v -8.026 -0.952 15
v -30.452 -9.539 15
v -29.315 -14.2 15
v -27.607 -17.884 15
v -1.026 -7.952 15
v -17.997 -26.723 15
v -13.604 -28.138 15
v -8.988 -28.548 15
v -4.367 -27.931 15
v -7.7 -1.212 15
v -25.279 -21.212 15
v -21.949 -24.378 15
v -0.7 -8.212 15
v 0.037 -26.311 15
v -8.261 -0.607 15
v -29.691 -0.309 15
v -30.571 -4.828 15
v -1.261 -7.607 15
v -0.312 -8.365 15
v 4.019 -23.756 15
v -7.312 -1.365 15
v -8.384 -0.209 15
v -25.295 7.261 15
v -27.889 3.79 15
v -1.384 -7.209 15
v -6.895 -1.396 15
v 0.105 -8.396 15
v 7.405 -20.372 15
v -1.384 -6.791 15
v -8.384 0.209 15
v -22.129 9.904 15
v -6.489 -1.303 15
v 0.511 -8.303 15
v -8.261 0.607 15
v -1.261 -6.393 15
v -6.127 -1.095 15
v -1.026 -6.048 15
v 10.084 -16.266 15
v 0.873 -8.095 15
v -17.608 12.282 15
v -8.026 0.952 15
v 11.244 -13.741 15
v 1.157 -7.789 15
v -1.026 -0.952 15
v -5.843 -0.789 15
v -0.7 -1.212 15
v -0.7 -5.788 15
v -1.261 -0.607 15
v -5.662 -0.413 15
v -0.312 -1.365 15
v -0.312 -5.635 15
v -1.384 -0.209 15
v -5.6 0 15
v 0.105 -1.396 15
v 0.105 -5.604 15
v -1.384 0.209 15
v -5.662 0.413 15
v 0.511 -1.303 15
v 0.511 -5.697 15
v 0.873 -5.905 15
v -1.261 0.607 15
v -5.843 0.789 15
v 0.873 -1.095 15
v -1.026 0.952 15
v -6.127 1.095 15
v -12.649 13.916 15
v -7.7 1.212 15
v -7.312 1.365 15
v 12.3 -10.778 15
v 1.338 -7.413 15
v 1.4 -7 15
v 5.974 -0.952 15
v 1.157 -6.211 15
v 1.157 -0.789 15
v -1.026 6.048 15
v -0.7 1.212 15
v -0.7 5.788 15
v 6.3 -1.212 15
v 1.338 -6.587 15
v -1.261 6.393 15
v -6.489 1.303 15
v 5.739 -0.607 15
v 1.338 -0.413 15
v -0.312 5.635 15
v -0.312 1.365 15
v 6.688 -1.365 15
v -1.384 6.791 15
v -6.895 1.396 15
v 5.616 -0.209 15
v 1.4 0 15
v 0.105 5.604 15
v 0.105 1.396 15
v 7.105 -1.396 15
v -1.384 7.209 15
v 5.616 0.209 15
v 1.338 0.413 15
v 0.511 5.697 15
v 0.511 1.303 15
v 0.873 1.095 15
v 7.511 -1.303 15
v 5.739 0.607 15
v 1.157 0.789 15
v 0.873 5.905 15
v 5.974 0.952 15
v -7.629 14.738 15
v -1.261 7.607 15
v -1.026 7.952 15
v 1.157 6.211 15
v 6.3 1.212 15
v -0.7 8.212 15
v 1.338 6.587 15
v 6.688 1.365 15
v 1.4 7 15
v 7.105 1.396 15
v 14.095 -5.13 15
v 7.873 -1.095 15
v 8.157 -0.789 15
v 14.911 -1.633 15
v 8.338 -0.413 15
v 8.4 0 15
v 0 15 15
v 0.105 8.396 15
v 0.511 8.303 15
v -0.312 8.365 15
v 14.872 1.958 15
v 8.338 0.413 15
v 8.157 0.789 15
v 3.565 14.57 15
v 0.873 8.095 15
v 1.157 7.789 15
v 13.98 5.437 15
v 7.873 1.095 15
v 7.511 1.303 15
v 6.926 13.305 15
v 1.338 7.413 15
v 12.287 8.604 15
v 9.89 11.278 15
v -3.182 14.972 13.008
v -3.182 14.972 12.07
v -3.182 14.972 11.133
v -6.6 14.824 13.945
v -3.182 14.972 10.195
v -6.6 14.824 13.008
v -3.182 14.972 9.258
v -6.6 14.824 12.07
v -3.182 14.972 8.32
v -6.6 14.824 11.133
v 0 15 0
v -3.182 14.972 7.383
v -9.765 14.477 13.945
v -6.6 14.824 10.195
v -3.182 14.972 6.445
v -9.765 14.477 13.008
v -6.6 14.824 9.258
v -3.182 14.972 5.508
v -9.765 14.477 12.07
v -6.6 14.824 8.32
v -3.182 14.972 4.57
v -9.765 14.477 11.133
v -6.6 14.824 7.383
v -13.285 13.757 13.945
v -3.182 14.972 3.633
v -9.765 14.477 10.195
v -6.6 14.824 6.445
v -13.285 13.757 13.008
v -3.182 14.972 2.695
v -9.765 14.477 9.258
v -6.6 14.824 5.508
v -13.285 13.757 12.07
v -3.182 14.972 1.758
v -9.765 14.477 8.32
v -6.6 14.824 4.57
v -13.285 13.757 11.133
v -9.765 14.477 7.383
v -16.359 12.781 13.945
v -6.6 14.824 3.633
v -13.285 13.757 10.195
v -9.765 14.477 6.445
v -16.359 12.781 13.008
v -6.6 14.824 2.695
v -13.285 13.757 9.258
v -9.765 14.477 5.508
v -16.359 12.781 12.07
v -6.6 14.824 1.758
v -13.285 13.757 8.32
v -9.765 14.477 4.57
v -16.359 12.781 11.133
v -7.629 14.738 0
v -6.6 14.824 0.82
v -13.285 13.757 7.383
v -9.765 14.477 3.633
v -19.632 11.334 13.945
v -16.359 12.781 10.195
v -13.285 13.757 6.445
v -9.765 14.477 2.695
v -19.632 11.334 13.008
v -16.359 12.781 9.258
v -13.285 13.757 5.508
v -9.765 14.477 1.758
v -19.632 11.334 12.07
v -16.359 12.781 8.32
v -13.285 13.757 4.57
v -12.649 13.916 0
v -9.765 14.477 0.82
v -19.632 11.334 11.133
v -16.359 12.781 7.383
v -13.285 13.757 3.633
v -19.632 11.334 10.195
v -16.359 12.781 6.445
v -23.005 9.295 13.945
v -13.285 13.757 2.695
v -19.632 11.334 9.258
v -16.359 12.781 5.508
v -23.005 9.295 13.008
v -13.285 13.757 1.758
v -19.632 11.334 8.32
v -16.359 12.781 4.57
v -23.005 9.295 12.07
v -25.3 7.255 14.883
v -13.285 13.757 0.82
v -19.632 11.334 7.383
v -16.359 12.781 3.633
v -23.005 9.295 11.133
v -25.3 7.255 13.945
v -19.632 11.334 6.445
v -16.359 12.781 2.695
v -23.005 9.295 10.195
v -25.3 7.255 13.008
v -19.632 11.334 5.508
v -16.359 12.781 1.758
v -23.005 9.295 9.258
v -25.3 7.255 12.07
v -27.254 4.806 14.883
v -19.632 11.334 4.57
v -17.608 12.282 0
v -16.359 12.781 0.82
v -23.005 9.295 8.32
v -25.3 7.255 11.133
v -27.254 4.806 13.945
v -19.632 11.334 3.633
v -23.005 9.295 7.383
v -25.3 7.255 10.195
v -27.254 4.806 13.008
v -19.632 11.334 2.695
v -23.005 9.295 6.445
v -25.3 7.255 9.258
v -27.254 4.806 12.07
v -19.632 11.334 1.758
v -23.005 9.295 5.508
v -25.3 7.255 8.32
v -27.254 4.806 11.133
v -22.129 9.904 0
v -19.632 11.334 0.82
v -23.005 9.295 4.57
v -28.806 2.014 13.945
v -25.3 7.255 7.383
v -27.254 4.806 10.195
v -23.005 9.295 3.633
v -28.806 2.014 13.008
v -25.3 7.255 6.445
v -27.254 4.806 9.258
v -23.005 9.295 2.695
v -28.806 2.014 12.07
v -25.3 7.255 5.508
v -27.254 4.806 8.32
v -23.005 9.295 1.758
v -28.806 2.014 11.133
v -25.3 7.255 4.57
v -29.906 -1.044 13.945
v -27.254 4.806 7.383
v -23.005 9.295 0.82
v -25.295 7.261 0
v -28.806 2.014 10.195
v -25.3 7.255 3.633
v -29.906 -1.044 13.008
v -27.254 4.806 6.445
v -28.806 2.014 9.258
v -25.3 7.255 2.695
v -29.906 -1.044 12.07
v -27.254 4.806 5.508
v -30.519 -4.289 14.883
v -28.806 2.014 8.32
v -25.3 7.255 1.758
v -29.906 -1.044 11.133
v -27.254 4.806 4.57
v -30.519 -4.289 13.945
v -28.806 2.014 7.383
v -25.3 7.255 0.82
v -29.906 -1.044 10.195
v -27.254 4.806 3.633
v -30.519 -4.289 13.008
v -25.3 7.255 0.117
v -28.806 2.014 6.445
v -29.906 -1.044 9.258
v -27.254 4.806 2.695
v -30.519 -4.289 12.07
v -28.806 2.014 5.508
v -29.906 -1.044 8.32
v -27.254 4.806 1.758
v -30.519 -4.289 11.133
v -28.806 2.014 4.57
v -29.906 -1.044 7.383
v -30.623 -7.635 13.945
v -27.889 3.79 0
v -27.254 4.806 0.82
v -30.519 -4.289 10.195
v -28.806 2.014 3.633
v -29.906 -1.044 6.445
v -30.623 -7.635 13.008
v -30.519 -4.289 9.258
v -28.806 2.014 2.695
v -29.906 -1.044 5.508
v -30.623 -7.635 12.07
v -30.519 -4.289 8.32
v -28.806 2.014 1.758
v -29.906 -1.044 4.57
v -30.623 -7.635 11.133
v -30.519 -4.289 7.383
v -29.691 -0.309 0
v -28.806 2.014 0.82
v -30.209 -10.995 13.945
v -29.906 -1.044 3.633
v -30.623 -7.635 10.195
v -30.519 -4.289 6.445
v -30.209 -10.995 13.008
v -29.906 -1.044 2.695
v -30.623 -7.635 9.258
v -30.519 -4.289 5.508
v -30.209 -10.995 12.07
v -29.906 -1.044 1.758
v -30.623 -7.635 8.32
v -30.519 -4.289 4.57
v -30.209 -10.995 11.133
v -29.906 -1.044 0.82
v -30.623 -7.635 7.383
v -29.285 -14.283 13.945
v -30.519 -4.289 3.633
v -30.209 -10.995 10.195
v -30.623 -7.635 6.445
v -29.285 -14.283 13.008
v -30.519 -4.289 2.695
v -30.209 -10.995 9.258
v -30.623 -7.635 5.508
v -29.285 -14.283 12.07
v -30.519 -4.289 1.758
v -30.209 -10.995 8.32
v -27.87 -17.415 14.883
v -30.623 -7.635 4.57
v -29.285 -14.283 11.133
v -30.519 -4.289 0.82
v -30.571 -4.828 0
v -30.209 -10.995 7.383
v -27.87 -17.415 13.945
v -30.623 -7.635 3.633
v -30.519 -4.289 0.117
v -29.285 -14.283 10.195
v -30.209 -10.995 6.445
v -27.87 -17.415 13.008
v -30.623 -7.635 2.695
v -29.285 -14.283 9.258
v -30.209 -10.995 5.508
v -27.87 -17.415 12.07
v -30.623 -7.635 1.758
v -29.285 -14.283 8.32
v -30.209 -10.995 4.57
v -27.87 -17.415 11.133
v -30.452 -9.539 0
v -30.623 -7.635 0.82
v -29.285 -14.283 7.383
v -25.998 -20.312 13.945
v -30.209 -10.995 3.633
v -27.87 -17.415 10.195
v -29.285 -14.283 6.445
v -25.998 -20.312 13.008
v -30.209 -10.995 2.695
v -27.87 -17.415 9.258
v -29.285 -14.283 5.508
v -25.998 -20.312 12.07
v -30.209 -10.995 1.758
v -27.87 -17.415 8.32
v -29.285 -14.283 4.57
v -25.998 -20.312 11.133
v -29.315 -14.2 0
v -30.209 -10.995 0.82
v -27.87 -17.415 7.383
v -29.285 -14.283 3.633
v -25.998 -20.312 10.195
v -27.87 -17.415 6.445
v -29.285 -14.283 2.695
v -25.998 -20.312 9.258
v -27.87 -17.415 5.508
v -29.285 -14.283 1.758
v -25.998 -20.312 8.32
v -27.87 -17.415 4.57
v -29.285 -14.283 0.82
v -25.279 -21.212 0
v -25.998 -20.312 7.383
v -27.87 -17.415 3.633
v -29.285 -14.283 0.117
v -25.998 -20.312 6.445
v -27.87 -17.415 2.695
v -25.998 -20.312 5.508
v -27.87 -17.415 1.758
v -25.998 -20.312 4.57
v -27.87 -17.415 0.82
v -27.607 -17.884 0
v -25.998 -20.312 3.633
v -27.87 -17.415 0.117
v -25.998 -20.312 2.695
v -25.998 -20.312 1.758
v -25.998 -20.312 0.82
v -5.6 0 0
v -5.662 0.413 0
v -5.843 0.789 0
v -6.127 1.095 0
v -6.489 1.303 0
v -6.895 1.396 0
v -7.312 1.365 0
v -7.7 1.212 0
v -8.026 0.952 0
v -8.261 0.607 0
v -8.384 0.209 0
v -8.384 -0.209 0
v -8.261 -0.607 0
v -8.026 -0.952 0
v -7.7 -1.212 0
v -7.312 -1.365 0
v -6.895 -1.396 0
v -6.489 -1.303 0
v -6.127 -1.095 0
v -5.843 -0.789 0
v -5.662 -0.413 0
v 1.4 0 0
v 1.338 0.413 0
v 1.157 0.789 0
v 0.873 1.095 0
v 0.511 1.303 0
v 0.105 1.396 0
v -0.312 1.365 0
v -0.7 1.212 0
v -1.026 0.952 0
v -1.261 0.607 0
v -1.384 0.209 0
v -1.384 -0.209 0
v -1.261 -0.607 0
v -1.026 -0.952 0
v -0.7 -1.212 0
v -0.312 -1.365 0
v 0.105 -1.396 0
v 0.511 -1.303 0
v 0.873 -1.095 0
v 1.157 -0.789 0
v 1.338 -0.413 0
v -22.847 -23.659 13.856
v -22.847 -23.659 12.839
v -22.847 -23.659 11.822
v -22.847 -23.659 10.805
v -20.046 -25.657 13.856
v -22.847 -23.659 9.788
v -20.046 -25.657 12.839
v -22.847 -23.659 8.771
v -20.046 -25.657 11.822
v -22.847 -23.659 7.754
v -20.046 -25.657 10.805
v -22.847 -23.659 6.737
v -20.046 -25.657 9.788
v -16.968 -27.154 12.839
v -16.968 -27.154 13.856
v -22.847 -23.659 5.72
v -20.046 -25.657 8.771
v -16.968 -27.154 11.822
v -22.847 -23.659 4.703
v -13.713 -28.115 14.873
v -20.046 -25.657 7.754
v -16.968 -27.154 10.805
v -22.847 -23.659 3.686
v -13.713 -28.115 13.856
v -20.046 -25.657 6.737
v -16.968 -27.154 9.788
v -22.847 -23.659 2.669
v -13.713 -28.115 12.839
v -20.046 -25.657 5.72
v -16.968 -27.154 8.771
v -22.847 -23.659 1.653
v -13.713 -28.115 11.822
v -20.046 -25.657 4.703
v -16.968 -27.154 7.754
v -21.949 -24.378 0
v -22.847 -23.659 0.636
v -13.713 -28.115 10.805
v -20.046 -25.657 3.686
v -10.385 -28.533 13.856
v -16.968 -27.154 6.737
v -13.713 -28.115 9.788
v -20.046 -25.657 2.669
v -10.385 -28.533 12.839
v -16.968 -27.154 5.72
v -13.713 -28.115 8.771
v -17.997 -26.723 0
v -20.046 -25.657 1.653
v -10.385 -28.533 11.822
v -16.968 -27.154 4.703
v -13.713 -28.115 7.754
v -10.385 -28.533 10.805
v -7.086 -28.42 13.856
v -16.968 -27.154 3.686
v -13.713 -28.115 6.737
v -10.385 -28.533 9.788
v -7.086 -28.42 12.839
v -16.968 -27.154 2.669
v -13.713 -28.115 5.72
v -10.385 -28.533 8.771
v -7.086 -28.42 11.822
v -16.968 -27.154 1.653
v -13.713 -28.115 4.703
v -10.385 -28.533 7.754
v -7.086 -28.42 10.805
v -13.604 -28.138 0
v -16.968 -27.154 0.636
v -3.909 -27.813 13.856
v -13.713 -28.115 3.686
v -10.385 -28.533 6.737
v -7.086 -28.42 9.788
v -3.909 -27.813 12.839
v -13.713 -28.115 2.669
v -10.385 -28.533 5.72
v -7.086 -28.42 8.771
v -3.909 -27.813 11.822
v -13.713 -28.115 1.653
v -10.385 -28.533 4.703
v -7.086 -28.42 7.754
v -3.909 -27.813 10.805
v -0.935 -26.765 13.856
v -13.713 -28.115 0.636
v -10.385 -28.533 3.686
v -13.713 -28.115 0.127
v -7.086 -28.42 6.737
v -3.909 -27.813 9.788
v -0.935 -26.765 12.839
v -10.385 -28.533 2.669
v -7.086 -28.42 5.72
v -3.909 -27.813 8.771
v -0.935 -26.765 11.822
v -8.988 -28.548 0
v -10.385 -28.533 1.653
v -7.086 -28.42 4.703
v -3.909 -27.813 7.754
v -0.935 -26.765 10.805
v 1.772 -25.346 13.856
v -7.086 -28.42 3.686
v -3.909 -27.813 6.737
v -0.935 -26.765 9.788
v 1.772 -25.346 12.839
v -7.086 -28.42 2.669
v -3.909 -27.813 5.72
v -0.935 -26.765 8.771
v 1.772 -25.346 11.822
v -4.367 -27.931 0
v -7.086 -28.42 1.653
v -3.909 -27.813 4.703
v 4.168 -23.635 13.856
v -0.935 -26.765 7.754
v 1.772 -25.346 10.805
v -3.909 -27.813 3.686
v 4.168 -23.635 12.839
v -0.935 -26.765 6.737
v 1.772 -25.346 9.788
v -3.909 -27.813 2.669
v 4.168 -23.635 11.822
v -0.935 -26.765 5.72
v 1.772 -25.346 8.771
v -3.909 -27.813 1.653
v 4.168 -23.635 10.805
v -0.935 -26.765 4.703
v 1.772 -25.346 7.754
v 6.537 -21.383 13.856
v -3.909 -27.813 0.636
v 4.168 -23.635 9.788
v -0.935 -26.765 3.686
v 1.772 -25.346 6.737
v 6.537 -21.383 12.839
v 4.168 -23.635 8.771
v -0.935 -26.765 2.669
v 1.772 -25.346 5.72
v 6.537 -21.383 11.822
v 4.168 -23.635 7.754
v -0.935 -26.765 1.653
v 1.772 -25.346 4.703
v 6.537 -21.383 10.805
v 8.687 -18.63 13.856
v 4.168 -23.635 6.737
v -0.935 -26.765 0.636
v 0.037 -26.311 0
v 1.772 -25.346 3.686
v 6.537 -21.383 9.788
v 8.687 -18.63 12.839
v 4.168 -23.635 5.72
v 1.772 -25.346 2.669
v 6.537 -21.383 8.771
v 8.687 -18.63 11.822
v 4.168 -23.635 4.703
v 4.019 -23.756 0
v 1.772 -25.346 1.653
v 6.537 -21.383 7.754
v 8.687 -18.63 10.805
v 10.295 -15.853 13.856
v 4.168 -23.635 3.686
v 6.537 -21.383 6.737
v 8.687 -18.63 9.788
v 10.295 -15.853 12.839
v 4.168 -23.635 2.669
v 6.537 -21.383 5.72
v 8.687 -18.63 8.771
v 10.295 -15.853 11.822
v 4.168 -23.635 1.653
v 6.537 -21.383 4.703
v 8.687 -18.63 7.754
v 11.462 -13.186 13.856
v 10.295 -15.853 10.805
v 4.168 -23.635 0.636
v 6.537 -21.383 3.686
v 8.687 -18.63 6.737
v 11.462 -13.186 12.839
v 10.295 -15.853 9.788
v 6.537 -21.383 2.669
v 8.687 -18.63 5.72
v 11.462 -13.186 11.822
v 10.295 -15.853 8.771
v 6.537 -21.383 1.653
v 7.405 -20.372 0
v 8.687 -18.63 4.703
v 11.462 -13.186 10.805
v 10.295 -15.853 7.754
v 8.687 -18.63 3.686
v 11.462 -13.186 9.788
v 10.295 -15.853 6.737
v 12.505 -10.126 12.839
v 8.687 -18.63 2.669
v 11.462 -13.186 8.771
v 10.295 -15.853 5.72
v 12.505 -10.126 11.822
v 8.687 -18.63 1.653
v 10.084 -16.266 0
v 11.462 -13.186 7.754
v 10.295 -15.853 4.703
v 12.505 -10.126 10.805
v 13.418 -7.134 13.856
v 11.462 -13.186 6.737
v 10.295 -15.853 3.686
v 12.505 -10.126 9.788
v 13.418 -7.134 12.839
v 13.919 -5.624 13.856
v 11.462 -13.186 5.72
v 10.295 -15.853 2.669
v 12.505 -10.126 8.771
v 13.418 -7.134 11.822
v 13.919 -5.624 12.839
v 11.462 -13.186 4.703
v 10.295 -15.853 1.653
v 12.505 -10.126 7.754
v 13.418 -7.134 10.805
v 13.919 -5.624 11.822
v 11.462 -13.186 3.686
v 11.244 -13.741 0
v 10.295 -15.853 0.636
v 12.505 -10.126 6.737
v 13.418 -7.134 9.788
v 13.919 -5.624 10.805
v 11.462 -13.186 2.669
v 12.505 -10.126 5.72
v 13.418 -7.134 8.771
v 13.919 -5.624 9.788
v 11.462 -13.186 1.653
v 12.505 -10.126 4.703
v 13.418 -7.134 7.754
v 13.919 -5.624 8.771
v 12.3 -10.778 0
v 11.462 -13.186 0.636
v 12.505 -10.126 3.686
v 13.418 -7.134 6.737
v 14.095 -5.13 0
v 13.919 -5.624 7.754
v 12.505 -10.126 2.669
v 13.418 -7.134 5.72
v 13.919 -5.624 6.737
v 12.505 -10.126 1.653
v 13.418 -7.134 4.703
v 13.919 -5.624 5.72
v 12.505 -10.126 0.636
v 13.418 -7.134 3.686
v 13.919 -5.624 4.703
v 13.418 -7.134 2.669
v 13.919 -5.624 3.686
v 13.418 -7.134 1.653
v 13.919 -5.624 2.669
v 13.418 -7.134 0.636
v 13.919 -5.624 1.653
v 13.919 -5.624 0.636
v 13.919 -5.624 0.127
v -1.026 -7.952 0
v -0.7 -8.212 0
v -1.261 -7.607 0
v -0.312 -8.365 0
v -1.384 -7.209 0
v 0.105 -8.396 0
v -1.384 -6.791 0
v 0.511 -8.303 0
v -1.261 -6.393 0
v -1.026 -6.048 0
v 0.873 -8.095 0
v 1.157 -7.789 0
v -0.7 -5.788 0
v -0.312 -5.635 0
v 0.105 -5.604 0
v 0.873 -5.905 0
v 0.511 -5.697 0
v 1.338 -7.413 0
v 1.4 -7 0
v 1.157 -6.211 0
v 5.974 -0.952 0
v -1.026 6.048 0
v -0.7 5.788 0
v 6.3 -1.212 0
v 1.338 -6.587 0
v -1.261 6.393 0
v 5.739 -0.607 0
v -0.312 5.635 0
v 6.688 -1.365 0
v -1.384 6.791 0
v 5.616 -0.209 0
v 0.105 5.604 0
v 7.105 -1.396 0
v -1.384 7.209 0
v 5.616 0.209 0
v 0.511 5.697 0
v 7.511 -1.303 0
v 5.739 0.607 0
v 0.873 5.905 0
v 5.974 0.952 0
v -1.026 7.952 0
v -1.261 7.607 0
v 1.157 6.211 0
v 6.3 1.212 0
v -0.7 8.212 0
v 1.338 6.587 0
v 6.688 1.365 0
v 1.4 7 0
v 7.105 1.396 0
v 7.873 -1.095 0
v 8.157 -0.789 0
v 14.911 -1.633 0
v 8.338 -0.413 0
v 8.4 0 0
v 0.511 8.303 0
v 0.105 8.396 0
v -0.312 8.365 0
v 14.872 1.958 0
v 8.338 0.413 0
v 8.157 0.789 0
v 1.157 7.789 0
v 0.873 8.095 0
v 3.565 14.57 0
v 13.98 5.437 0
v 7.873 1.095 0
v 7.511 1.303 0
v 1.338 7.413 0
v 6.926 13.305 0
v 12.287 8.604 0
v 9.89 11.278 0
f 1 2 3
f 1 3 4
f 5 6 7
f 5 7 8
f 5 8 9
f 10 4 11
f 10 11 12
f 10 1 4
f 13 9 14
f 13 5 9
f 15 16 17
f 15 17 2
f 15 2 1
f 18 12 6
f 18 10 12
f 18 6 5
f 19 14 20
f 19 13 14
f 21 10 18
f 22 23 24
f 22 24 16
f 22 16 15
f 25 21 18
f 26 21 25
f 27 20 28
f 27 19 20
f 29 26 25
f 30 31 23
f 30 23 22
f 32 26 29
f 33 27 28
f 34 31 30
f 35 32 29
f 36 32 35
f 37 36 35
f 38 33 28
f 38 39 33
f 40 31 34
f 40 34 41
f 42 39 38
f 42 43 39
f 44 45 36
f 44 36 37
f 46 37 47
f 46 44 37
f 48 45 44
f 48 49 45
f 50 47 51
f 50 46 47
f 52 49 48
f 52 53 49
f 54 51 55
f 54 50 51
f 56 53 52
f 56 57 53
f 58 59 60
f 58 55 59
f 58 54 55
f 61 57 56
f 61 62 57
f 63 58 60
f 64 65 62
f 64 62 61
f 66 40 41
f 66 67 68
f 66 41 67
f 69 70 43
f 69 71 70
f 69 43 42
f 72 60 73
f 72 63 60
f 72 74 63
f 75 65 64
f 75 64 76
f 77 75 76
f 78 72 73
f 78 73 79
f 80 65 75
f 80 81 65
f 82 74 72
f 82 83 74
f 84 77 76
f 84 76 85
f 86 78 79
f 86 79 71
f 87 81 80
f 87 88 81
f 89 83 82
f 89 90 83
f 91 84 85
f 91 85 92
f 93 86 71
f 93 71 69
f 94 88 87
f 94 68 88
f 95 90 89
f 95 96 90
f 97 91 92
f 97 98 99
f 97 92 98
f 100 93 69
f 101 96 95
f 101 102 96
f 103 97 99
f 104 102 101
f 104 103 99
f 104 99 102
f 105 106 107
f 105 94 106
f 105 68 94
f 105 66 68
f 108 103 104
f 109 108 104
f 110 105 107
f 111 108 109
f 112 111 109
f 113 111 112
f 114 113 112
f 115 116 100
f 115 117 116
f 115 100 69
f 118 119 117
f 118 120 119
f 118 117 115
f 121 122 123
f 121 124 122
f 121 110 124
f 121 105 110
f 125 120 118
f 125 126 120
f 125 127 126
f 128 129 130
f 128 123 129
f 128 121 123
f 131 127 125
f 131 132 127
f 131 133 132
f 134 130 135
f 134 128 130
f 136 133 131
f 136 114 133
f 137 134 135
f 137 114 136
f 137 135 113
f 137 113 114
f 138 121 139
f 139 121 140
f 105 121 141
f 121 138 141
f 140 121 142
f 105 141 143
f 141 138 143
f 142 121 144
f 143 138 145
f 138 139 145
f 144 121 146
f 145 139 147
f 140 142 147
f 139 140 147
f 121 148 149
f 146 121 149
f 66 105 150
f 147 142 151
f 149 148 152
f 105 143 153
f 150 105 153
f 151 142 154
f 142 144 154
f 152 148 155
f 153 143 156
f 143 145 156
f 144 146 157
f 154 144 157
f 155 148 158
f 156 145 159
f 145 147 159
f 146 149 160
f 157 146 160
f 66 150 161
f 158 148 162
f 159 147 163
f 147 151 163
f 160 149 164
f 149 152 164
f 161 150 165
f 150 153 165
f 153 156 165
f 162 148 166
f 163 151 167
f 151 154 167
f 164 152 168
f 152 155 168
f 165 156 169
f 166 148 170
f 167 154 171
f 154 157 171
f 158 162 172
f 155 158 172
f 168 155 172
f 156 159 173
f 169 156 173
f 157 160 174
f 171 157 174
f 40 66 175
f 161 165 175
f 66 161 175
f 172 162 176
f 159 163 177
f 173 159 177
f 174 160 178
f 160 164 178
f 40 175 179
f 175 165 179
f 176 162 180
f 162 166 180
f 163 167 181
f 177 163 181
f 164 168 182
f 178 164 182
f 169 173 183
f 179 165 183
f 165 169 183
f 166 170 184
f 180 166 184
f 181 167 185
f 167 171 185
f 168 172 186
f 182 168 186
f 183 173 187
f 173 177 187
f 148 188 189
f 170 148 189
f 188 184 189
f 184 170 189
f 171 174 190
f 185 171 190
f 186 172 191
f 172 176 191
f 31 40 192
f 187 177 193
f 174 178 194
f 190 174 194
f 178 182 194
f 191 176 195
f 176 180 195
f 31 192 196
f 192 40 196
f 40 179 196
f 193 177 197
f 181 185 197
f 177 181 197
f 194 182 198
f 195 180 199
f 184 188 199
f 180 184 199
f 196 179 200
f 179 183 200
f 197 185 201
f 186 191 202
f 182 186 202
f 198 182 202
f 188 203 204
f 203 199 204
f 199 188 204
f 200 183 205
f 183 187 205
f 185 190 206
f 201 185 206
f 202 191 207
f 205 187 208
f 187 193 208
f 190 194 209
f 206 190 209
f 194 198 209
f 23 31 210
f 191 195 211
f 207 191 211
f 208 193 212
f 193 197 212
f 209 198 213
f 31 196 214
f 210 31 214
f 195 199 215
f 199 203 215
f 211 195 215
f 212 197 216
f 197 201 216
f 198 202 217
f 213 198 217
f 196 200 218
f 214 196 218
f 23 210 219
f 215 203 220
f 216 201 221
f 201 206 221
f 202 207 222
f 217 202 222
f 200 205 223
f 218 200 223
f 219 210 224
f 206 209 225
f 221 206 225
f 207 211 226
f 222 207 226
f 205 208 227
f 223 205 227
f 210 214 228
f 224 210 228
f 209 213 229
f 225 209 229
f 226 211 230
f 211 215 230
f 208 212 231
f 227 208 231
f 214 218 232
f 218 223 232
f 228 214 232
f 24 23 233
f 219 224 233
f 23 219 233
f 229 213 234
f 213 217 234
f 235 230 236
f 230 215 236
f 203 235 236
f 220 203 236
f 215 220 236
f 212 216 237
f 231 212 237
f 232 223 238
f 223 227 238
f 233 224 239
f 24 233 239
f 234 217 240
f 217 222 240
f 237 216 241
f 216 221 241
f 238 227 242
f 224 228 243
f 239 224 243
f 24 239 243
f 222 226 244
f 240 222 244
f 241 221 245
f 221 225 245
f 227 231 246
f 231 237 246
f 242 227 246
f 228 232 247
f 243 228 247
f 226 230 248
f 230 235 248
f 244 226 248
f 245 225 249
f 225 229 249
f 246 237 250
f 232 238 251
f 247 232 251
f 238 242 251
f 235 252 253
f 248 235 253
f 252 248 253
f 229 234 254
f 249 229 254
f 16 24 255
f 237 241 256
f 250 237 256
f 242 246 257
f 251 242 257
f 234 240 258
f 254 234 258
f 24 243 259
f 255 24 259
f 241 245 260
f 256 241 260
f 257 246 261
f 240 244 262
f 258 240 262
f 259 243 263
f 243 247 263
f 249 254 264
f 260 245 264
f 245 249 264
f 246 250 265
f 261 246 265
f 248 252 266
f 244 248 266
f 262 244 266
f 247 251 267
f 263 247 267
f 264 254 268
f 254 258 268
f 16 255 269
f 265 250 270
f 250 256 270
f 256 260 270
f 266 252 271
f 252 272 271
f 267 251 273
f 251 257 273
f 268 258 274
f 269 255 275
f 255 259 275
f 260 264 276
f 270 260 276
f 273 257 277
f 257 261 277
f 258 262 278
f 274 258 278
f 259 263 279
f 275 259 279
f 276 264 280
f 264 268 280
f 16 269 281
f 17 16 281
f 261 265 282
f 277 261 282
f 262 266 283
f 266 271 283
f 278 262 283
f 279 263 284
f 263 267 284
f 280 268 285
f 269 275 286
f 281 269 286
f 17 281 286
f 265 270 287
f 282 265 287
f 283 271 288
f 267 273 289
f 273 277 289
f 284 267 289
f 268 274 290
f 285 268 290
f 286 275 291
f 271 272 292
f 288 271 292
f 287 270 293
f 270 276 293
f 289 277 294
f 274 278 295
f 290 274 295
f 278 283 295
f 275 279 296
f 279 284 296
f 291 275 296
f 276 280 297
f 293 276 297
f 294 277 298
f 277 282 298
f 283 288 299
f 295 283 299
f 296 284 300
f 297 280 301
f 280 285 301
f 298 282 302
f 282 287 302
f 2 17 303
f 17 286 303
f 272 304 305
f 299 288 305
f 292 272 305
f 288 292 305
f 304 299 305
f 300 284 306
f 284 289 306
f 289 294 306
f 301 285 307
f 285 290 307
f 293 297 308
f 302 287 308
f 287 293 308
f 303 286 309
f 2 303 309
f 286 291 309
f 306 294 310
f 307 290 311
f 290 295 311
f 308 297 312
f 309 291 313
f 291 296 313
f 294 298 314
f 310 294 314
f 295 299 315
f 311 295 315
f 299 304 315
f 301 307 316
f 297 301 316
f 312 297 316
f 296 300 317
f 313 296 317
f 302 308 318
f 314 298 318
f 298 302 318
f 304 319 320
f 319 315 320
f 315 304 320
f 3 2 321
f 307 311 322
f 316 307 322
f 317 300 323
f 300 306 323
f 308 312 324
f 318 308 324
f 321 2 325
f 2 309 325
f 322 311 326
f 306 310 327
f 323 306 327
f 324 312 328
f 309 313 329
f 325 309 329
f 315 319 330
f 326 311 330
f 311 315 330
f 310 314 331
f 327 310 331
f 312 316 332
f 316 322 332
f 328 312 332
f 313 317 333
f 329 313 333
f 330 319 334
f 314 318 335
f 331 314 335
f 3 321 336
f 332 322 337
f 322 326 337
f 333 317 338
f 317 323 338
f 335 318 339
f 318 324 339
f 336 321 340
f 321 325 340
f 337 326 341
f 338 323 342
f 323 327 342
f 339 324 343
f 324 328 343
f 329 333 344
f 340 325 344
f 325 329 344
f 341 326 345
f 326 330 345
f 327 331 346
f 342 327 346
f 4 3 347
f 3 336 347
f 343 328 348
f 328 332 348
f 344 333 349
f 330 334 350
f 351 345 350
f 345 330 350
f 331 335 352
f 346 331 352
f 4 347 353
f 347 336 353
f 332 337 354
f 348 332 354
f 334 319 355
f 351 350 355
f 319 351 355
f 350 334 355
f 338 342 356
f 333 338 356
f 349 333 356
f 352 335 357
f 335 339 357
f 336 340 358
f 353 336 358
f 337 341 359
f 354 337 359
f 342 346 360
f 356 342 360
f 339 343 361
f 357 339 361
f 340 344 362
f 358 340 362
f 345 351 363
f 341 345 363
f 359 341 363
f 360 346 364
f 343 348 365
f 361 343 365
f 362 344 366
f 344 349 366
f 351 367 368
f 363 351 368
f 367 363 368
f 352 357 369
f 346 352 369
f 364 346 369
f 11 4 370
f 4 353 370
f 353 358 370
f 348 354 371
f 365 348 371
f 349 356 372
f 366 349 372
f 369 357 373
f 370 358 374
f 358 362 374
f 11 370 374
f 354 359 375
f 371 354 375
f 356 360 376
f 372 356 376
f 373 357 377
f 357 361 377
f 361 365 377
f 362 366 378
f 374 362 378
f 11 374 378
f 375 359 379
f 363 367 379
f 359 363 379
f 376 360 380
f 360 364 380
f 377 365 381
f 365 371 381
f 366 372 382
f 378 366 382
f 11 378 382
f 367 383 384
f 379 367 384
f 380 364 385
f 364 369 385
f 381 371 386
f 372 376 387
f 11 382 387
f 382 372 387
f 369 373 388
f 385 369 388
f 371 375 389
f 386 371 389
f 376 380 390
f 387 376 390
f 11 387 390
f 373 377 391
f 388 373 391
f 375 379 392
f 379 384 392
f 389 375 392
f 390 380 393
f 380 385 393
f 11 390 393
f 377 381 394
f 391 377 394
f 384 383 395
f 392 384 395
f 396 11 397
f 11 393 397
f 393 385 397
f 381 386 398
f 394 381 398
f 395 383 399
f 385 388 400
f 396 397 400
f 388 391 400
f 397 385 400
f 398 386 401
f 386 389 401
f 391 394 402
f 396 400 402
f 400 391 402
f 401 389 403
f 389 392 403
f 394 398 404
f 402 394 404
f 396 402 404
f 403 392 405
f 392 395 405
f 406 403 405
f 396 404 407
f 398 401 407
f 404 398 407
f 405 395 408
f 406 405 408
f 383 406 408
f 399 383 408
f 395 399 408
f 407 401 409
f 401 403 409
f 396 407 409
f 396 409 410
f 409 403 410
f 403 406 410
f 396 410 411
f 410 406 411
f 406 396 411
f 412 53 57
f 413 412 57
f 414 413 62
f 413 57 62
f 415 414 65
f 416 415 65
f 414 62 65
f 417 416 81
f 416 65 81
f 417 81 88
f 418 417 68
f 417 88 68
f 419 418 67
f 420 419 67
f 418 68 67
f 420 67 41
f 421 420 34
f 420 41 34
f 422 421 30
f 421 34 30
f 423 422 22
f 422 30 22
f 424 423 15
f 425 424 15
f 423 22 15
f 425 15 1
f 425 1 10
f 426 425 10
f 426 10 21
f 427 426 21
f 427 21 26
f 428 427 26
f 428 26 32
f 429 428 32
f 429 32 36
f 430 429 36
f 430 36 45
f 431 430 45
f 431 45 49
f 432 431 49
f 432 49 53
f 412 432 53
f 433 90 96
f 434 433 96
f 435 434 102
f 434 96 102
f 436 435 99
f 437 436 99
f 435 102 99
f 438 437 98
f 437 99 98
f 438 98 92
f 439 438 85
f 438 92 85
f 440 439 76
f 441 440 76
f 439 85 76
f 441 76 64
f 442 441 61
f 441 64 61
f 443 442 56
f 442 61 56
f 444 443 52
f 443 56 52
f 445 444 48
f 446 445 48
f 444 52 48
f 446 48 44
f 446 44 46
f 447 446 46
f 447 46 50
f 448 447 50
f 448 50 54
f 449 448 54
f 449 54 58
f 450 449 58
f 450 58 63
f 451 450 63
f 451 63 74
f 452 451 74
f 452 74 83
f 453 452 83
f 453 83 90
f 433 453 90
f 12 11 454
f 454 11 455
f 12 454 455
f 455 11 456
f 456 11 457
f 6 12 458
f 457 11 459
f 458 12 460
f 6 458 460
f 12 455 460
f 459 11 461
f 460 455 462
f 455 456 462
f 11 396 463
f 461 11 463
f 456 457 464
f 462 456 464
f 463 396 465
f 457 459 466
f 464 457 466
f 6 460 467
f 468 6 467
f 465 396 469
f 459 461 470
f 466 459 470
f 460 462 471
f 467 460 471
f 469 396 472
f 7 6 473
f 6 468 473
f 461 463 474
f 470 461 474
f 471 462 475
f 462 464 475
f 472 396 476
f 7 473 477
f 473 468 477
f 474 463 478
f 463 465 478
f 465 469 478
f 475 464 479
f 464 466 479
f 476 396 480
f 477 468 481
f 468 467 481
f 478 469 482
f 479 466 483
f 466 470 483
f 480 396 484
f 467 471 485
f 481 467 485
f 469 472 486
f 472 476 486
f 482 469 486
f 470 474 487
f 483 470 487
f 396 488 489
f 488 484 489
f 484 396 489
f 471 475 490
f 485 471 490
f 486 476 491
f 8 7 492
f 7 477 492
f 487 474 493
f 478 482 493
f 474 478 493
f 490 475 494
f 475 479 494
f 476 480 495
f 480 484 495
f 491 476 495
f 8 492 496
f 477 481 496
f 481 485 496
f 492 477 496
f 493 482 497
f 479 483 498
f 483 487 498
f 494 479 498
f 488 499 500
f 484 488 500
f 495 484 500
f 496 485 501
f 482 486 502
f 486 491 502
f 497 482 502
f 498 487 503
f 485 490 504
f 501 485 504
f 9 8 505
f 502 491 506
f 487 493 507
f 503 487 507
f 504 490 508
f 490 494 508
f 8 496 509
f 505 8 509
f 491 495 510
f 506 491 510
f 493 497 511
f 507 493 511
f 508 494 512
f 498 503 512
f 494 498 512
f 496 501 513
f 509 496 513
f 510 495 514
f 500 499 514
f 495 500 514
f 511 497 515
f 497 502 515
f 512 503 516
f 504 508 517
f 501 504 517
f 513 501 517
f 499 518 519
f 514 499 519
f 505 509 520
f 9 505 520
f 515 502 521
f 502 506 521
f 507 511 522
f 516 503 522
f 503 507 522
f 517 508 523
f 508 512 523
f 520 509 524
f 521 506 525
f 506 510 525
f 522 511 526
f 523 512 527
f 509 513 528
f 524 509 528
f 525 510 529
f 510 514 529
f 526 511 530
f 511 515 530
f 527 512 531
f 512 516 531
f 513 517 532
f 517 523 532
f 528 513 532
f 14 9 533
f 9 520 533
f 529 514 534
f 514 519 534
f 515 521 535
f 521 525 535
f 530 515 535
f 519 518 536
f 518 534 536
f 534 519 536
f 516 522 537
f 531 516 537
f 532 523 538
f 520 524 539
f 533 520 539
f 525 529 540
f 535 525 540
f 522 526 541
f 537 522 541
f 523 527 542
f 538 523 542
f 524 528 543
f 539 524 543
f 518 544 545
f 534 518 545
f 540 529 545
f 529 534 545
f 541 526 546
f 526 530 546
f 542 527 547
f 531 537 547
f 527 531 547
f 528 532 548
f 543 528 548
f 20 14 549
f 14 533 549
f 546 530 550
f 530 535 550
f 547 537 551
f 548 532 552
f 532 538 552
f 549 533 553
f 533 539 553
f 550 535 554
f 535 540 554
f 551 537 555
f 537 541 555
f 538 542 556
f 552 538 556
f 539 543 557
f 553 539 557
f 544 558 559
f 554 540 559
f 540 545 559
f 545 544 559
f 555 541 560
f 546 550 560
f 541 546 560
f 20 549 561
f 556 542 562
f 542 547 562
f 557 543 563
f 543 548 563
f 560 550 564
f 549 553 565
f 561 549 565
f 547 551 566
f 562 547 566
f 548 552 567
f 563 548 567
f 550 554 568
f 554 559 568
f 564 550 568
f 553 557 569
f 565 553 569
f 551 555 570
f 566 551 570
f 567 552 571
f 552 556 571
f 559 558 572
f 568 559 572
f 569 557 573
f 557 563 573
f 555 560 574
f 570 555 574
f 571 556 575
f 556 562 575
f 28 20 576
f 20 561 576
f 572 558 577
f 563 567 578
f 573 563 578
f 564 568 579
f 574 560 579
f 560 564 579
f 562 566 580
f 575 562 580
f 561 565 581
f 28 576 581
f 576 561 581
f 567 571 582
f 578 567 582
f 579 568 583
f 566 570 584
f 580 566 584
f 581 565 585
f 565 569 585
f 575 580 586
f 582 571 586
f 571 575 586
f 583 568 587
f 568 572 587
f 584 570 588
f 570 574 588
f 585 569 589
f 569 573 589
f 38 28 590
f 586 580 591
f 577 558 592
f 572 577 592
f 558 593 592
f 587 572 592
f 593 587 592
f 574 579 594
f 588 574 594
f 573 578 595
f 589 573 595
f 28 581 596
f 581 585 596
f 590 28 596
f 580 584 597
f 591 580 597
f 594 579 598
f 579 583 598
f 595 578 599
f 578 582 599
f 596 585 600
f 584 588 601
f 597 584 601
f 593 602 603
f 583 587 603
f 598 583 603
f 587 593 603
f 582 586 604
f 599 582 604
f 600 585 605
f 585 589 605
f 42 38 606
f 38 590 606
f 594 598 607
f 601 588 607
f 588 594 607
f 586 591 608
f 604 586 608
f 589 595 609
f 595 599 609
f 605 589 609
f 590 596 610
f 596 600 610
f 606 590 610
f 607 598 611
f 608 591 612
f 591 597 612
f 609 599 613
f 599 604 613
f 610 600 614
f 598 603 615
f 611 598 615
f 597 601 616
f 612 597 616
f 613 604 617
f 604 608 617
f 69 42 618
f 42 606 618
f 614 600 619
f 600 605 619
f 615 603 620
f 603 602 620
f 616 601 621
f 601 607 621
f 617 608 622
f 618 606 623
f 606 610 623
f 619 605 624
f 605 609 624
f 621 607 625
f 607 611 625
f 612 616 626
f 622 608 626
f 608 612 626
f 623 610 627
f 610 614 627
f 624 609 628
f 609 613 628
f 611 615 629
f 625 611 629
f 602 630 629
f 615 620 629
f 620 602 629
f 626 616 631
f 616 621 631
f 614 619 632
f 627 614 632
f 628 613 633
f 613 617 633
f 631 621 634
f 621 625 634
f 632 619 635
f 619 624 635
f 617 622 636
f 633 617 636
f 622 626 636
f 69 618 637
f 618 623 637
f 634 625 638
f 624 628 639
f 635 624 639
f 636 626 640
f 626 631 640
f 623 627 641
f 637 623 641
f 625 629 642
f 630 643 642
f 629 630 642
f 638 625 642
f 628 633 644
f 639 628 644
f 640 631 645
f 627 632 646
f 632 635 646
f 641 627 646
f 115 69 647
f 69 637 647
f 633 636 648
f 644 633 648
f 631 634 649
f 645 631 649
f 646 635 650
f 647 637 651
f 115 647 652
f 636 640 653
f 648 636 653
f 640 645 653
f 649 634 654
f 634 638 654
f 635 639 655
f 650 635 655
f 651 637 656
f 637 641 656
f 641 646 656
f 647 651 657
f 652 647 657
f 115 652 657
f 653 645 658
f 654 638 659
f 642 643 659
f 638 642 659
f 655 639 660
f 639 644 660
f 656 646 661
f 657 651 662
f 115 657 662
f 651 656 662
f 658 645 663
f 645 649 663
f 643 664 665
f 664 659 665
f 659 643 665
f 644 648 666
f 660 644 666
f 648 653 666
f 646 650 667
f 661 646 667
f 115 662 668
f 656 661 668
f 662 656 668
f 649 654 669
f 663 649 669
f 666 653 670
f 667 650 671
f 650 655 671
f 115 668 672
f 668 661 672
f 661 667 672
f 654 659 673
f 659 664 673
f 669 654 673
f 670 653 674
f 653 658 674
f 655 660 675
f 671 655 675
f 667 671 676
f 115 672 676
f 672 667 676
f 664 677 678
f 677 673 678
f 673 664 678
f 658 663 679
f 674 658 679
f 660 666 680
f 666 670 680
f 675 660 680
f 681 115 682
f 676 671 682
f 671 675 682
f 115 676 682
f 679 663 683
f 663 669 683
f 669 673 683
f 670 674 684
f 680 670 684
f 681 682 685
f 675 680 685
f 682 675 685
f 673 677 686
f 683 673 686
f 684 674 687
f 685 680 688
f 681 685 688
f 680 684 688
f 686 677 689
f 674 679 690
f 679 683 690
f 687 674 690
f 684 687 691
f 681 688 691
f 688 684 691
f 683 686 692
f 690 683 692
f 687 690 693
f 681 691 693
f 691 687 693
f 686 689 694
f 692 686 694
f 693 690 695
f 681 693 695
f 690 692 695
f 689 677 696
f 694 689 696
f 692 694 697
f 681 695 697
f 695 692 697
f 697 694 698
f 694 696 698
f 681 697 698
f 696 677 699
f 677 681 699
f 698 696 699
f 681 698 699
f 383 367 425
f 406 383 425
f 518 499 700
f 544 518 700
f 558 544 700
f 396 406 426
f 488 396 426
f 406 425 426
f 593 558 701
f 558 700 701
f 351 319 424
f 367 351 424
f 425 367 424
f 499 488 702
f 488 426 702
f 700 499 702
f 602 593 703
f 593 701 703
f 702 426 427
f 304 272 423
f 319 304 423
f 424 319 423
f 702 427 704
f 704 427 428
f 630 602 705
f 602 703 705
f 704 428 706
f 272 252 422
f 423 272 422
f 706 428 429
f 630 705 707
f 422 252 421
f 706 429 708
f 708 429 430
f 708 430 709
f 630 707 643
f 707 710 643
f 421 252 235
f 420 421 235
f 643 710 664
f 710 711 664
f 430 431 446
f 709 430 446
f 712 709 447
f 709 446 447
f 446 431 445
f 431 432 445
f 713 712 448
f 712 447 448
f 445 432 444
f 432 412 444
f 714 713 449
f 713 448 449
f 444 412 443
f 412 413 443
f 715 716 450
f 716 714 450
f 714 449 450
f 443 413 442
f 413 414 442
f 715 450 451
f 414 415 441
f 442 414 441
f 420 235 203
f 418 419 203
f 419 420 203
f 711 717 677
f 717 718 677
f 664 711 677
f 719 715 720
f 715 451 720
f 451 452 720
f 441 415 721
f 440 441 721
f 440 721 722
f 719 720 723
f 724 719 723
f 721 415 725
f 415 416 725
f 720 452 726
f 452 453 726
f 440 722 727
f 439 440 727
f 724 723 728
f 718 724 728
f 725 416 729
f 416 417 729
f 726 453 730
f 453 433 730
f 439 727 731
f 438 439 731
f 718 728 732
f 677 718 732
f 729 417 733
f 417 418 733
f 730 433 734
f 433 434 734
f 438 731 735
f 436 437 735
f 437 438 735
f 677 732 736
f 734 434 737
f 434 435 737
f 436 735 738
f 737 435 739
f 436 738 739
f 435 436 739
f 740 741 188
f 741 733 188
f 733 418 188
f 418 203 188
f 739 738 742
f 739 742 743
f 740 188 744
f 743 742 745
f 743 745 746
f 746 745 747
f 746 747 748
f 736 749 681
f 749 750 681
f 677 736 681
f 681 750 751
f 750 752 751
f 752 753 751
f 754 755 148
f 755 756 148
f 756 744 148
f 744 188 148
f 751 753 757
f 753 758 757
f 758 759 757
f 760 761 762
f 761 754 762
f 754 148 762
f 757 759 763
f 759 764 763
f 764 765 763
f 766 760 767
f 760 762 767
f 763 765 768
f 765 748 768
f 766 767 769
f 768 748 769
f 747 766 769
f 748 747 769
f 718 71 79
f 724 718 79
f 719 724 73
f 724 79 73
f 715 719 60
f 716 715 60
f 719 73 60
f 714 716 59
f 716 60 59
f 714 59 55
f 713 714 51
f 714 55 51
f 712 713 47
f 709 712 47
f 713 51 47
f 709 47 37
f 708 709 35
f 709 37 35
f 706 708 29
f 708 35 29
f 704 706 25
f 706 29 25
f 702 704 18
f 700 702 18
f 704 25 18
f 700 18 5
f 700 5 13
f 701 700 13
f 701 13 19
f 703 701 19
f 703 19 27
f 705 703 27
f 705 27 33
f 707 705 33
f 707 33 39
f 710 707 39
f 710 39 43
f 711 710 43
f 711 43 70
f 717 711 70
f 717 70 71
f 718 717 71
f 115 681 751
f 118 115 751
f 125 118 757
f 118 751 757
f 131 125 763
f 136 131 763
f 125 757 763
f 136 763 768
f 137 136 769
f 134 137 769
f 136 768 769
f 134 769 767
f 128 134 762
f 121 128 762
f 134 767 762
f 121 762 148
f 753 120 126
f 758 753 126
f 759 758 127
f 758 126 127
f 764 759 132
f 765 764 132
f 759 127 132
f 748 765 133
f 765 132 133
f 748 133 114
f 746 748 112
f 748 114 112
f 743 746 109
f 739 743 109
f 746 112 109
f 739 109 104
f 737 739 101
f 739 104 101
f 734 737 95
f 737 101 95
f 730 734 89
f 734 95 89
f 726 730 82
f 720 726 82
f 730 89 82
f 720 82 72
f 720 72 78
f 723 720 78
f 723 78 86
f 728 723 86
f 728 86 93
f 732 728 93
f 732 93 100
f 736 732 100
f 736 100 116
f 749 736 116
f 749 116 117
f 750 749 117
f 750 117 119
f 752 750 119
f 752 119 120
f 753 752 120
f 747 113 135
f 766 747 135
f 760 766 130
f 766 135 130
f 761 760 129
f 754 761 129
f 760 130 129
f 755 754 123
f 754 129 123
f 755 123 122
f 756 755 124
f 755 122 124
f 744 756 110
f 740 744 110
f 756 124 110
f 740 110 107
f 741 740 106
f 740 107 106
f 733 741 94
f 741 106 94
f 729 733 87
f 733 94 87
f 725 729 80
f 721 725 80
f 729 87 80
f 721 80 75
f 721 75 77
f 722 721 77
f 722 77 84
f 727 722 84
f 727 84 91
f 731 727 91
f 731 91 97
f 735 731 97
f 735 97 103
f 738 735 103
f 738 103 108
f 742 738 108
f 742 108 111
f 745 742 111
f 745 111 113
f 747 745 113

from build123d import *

# Parameters (mm, degrees)
EXTRUDE_1_DEPTH     = 15
SKETCH_3_R          = 1.4
CUT_EXTRUDE_2_DEPTH = 45.491091955


with BuildPart() as part:
    # 草图1 → 凸台-拉伸1 (new body)
    with BuildSketch(Plane.XY):
        with BuildLine():
            ThreePointArc((14.095389312, -5.13030215), (12.287280664, 8.603646545), (0, 15))
            add(Edge.make_bspline(
                [(0, 15), (-0.174596768, 14.999999319), (-0.436611581, 14.999693042), (-0.786186323, 14.998643785), (-1.048915847, 14.997519085), (-1.312216235, 14.99603471), (-1.576228693, 14.994161918), (-1.84109342, 14.991865662), (-2.106949414, 14.989104591), (-2.373934268, 14.985831089), (-2.642183971, 14.981991319), (-2.911832716, 14.977525266), (-3.1830127, 14.972366794), (-3.455853932, 14.966443701), (-3.730484039, 14.959677782), (-4.007028071, 14.9519849), (-4.285608318, 14.943275054), (-4.566344116, 14.933452466), (-4.849351664, 14.922415656), (-5.134743838, 14.910057537), (-5.422630012, 14.896265505), (-5.713115875, 14.880921543), (-6.006303259, 14.863902316), (-6.302289959, 14.84507929), (-6.601169567, 14.824318836), (-6.903031299, 14.801482354), (-7.207959833, 14.776426392), (-7.516035146, 14.749002775), (-7.827332351, 14.719058736), (-8.141921549, 14.686437053), (-8.459867669, 14.650976187), (-8.781230323, 14.612510428), (-9.106063662, 14.570870045), (-9.434416233, 14.525881438), (-9.766330843, 14.477367292), (-10.101844426, 14.425146744), (-10.440987913, 14.36903554), (-10.783786108, 14.30884621), (-11.130257567, 14.244388236), (-11.480414483, 14.175468229), (-11.834262574, 14.101890107), (-12.191800976, 14.023455277), (-12.553022141, 13.939962822), (-12.917911738, 13.851209688), (-13.286448564, 13.756990875), (-13.658604451, 13.657099633), (-14.03434419, 13.551327657), (-14.413625446, 13.439465288), (-14.796398691, 13.321301714), (-15.182607133, 13.196625177), (-15.572186657, 13.065223175), (-15.965065767, 12.926882676), (-16.361165533, 12.781390325), (-16.760399548, 12.62853266), (-17.162673883, 12.468096321), (-17.567887059, 12.299868276), (-17.975930009, 12.12363602), (-18.386686074, 11.939187837), (-18.800030904, 11.746312879), (-19.21583277, 11.544801919), (-19.63395132, 11.334445536), (-20.054242271, 11.115042096), (-20.476539575, 10.886368472), (-20.900723293, 10.648292485), (-21.326461435, 10.400346233), (-21.753514654, 10.143757392), (-22.178049863, 9.87535726), (-22.595959424, 9.592299141), (-23.006858872, 9.296248411), (-23.410215858, 8.987163154), (-23.805723663, 8.665361009), (-24.19302422, 8.331073979), (-24.571782966, 7.984568061), (-24.94166894, 7.626110759), (-25.302360391, 7.255979562), (-25.65354351, 6.874459377), (-25.994913004, 6.481842935), (-26.326172169, 6.078430394), (-26.647033089, 5.664529144), (-26.957216795, 5.240453567), (-27.256453426, 4.80652479), (-27.544482381, 4.363070443), (-27.82105247, 3.910424411), (-28.085922052, 3.448926584), (-28.338859169, 2.978922599), (-28.579641679, 2.500763586), (-28.808057373, 2.014805906), (-29.023904095, 1.521410888), (-29.226989847, 1.020944566), (-29.417132895, 0.513777409), (-29.594161862, 0.000284053), (-29.757915818, -0.519156969), (-29.908244365, -1.044163505), (-30.045007708, -1.574350056), (-30.168076728, -2.109328051), (-30.277333041, -2.648706129), (-30.372669056, -3.192090415), (-30.453988019, -3.739084801), (-30.521204062, -4.289291227), (-30.574242228, -4.842309963), (-30.613038507, -5.39773989), (-30.637539851, -5.955178784), (-30.647704191, -6.514223598), (-30.643500444, -7.074470745), (-30.624908509, -7.63551638), (-30.591919266, -8.196956684), (-30.544534557, -8.758388145), (-30.48276717, -9.319407838), (-30.406640805, -9.879613709), (-30.316190047, -10.438604851), (-30.21146032, -10.995981785), (-30.092507839, -11.551346736), (-29.95939956, -12.104303912), (-29.812213112, -12.654459772), (-29.651036733, -13.201423307), (-29.475969194, -13.744806302), (-29.287119719, -14.284223615), (-29.084607895, -14.819293432), (-28.868563581, -15.349637541), (-28.639126801, -15.874881588), (-28.396447646, -16.394655341), (-28.140686152, -16.908592941), (-27.872012186, -17.416333158), (-27.590605319, -17.917519643), (-27.296654692, -18.411801174), (-26.990358881, -18.898831896), (-26.671925755, -19.378271573), (-26.341572303, -19.849785794), (-25.885480421, -20.467504768), (-25.526267712, -20.917866263), (-25.279466623, -21.21199112)],
                knots=[0, 0, 0, 0, 0.008983592, 0.013481544, 0.017986876, 0.022502032, 0.027029448, 0.031571543, 0.036130722, 0.040709366, 0.045309838, 0.049934477, 0.054585593, 0.059265472, 0.063976367, 0.068720504, 0.073500073, 0.078317234, 0.083174111, 0.088072793, 0.093015336, 0.098003759, 0.103040044, 0.108126138, 0.113263955, 0.118455369, 0.123702222, 0.129006319, 0.134369433, 0.139793302, 0.145279632, 0.150830096, 0.156446337, 0.162129965, 0.167882565, 0.173705688, 0.179600863, 0.185569587, 0.191613334, 0.197733555, 0.203931674, 0.210209093, 0.216567194, 0.223007337, 0.229530862, 0.236139089, 0.242833322, 0.249614847, 0.256484933, 0.263444834, 0.270495789, 0.277639024, 0.284875752, 0.292207171, 0.299634469, 0.307158825, 0.314781404, 0.322503362, 0.330325849, 0.338250002, 0.346276954, 0.354407827, 0.362643738, 0.370985797, 0.379435108, 0.387992769, 0.396619209, 0.405274739, 0.413959558, 0.422673829, 0.431417677, 0.440191194, 0.448994436, 0.457827427, 0.466690157, 0.475582587, 0.484504647, 0.493456237, 0.50243723, 0.511447469, 0.520486775, 0.529554938, 0.538651727, 0.547776885, 0.556930133, 0.566111169, 0.575319669, 0.584555288, 0.593817663, 0.603106409, 0.612421123, 0.621761385, 0.631126755, 0.64051678, 0.649930987, 0.659368891, 0.66882999, 0.678313767, 0.687819694, 0.697347228, 0.706895812, 0.71646488, 0.726053851, 0.735662137, 0.745289135, 0.754934234, 0.764596814, 0.774276244, 0.783971886, 0.793683092, 0.803409207, 0.813149569, 0.822903507, 0.832670344, 0.8424494, 0.852239983, 0.862041401, 0.871852953, 0.881673937, 0.891503642, 0.901341356, 0.911186363, 0.921037943, 0.930895373, 0.940757928, 0.95062488, 0.960495499, 0.970369054, 0.980244811, 1, 1, 1, 1], degree=3))
            add(Edge.make_bspline(
                [(-25.279466623, -21.21199112), (-25.03266702, -21.506118015), (-24.650058643, -21.936850324), (-24.116326131, -22.48889957), (-23.704647777, -22.89139552), (-23.281933222, -23.282038607), (-22.848561661, -23.660506241), (-22.404923763, -24.026490317), (-21.951421131, -24.379697722), (-21.48846567, -24.719850743), (-21.016478952, -25.046687464), (-20.535891561, -25.359962134), (-20.047142425, -25.659445508), (-19.550678137, -25.944925156), (-19.04695226, -26.216205747), (-18.536424623, -26.4731093), (-18.019560603, -26.715475403), (-17.496830406, -26.943161412), (-16.968708336, -27.156042604), (-16.435672059, -27.354012309), (-15.898201862, -27.536982008), (-15.35677991, -27.704881402), (-14.811889501, -27.857658441), (-14.264014323, -27.995279333), (-13.713637708, -28.117728512), (-13.161241887, -28.225008578), (-12.607307258, -28.317140209), (-12.052311649, -28.394162034), (-11.496729594, -28.456130483), (-10.941031611, -28.5031196), (-10.385683496, -28.535220833), (-9.831145623, -28.552542784), (-9.277872252, -28.555210939), (-8.726310862, -28.543367367), (-8.176901485, -28.517170386), (-7.630076062, -28.476794208), (-7.086257816, -28.422428554), (-6.545860639, -28.354278239), (-6.009288499, -28.272562744), (-5.476934872, -28.177515748), (-4.949182183, -28.069384646), (-4.426401286, -27.948430045), (-3.908950946, -27.814925234), (-3.397177365, -27.669155633), (-2.891413716, -27.511418228), (-2.391979716, -27.342020982), (-1.899181211, -27.161282232), (-1.413309805, -26.969530066), (-0.934642496, -26.767101692), (-0.463441361, -26.554342786), (4.6748e-05, -26.331606829), (0.455590466, -26.099254437), (0.902974156, -25.857652676), (1.341998114, -25.607174371), (1.77247875, -25.348197408), (2.194248731, -25.081104026), (2.607157097, -24.806280109), (3.011069352, -24.524114474), (3.405867507, -24.234998154), (3.791450116, -23.939323681), (4.167732256, -23.637484373), (4.534645494, -23.329873622), (4.892137816, -23.016884179), (5.240173528, -22.698907455), (5.578733117, -22.376332816), (5.907813101, -22.049546899), (6.22742583, -21.71893292), (6.537599266, -21.384870008), (6.838376738, -21.047732541), (7.129816662, -20.707889495), (7.411992235, -20.365703811), (7.684991105, -20.021531772), (7.948915008, -19.675722401), (8.20387939, -19.32861687), (8.450012994, -18.980547932), (8.687457427, -18.631839373), (8.916366703, -18.282805481), (9.136906768, -17.933750534), (9.349254998, -17.58496832), (9.553599678, -17.236741672), (9.750139466, -16.889342026), (9.939082834, -16.543029011), (10.120647493, -16.198050057), (10.295059808, -15.854640037), (10.462554187, -15.513020927), (10.623372469, -15.173401503), (10.777763289, -14.835977057), (10.925981441, -14.50092915), (11.068287227, -14.168425389), (11.204945795, -13.838619231), (11.336226478, -13.511649827), (11.462402118, -13.187641886), (11.583748391, -12.866705573), (11.70054313, -12.548936438), (11.813065642, -12.234415378), (11.921596028, -11.923208621), (12.026414502, -11.615367753), (12.127800711, -11.310929767), (12.226033064, -11.009917143), (12.321388061, -10.712337965), (12.414139626, -10.418186058), (12.504558455, -10.127441167), (12.592911364, -9.840069152), (12.679460654, -9.556022225), (12.76446348, -9.275239204), (12.848171238, -8.997645806), (12.93082896, -8.723154954), (13.01267473, -8.451667126), (13.093939106, -8.183070715), (13.174844564, -7.917242422), (13.255604965, -7.654047671), (13.336425025, -7.393341046), (13.417499824, -7.134966749), (13.49901432, -6.87875908), (13.581142893, -6.624542932), (13.664048917, -6.372134315), (13.747884322, -6.121340875), (13.832789331, -5.871962488), (13.947500586, -5.541332702), (14.035654827, -5.294414261), (14.095389312, -5.13030215)],
                knots=[0, 0, 0, 0, 0.021270399, 0.031903677, 0.042534645, 0.053162531, 0.063786554, 0.074405932, 0.085019874, 0.095627584, 0.106228257, 0.116821079, 0.127405228, 0.137979868, 0.148544155, 0.15909723, 0.169638222, 0.180166248, 0.190680407, 0.201179787, 0.211663457, 0.222130473, 0.232579872, 0.243010676, 0.253421887, 0.263812492, 0.27418146, 0.284527741, 0.294850266, 0.30514795, 0.315419689, 0.32566436, 0.335880824, 0.346067921, 0.356224476, 0.366349296, 0.376441173, 0.386498878, 0.396521172, 0.406506796, 0.416454478, 0.426362934, 0.436230863, 0.446056956, 0.45583989, 0.465578331, 0.475270938, 0.48491636, 0.49451324, 0.504060215, 0.513555916, 0.522998973, 0.532388013, 0.541721663, 0.550998551, 0.560217309, 0.569376572, 0.578474983, 0.587511192, 0.596483859, 0.605391658, 0.614233274, 0.623007411, 0.631712789, 0.640348151, 0.64891226, 0.657403907, 0.66582191, 0.674165115, 0.682432404, 0.690622694, 0.69873494, 0.706768137, 0.714721328, 0.7225936, 0.730384093, 0.738092, 0.745716573, 0.753257123, 0.760713027, 0.76808373, 0.775368751, 0.782567685, 0.789680206, 0.796706075, 0.803645143, 0.810497353, 0.81726275, 0.823941479, 0.830533798, 0.837040075, 0.8434608, 0.849796585, 0.856048172, 0.86221644, 0.868302406, 0.874307234, 0.880232236, 0.886078882, 0.891848803, 0.897543794, 0.903165817, 0.908717009, 0.914199683, 0.919616328, 0.924969613, 0.930262387, 0.935497677, 0.94067869, 0.945808804, 0.950891568, 0.955930696, 0.960930056, 0.965893662, 0.970825666, 0.975730339, 0.980612064, 0.985475315, 0.990324642, 1, 1, 1, 1], degree=3))
        make_face()
    extrude(amount=EXTRUDE_1_DEPTH)

    # 草图3 → 切除-拉伸2 (cut, through all)
    with BuildSketch(Plane.XY.offset(15)):
        Circle(SKETCH_3_R)
        with Locations((7, 0)):
            Circle(SKETCH_3_R)
        with Locations((0, -7)):
            Circle(SKETCH_3_R)
        with Locations((-7, 0)):
            Circle(SKETCH_3_R)
        with Locations((0, 7)):
            Circle(SKETCH_3_R)
    extrude(amount=-CUT_EXTRUDE_2_DEPTH, mode=Mode.SUBTRACT)


solid = part.part
